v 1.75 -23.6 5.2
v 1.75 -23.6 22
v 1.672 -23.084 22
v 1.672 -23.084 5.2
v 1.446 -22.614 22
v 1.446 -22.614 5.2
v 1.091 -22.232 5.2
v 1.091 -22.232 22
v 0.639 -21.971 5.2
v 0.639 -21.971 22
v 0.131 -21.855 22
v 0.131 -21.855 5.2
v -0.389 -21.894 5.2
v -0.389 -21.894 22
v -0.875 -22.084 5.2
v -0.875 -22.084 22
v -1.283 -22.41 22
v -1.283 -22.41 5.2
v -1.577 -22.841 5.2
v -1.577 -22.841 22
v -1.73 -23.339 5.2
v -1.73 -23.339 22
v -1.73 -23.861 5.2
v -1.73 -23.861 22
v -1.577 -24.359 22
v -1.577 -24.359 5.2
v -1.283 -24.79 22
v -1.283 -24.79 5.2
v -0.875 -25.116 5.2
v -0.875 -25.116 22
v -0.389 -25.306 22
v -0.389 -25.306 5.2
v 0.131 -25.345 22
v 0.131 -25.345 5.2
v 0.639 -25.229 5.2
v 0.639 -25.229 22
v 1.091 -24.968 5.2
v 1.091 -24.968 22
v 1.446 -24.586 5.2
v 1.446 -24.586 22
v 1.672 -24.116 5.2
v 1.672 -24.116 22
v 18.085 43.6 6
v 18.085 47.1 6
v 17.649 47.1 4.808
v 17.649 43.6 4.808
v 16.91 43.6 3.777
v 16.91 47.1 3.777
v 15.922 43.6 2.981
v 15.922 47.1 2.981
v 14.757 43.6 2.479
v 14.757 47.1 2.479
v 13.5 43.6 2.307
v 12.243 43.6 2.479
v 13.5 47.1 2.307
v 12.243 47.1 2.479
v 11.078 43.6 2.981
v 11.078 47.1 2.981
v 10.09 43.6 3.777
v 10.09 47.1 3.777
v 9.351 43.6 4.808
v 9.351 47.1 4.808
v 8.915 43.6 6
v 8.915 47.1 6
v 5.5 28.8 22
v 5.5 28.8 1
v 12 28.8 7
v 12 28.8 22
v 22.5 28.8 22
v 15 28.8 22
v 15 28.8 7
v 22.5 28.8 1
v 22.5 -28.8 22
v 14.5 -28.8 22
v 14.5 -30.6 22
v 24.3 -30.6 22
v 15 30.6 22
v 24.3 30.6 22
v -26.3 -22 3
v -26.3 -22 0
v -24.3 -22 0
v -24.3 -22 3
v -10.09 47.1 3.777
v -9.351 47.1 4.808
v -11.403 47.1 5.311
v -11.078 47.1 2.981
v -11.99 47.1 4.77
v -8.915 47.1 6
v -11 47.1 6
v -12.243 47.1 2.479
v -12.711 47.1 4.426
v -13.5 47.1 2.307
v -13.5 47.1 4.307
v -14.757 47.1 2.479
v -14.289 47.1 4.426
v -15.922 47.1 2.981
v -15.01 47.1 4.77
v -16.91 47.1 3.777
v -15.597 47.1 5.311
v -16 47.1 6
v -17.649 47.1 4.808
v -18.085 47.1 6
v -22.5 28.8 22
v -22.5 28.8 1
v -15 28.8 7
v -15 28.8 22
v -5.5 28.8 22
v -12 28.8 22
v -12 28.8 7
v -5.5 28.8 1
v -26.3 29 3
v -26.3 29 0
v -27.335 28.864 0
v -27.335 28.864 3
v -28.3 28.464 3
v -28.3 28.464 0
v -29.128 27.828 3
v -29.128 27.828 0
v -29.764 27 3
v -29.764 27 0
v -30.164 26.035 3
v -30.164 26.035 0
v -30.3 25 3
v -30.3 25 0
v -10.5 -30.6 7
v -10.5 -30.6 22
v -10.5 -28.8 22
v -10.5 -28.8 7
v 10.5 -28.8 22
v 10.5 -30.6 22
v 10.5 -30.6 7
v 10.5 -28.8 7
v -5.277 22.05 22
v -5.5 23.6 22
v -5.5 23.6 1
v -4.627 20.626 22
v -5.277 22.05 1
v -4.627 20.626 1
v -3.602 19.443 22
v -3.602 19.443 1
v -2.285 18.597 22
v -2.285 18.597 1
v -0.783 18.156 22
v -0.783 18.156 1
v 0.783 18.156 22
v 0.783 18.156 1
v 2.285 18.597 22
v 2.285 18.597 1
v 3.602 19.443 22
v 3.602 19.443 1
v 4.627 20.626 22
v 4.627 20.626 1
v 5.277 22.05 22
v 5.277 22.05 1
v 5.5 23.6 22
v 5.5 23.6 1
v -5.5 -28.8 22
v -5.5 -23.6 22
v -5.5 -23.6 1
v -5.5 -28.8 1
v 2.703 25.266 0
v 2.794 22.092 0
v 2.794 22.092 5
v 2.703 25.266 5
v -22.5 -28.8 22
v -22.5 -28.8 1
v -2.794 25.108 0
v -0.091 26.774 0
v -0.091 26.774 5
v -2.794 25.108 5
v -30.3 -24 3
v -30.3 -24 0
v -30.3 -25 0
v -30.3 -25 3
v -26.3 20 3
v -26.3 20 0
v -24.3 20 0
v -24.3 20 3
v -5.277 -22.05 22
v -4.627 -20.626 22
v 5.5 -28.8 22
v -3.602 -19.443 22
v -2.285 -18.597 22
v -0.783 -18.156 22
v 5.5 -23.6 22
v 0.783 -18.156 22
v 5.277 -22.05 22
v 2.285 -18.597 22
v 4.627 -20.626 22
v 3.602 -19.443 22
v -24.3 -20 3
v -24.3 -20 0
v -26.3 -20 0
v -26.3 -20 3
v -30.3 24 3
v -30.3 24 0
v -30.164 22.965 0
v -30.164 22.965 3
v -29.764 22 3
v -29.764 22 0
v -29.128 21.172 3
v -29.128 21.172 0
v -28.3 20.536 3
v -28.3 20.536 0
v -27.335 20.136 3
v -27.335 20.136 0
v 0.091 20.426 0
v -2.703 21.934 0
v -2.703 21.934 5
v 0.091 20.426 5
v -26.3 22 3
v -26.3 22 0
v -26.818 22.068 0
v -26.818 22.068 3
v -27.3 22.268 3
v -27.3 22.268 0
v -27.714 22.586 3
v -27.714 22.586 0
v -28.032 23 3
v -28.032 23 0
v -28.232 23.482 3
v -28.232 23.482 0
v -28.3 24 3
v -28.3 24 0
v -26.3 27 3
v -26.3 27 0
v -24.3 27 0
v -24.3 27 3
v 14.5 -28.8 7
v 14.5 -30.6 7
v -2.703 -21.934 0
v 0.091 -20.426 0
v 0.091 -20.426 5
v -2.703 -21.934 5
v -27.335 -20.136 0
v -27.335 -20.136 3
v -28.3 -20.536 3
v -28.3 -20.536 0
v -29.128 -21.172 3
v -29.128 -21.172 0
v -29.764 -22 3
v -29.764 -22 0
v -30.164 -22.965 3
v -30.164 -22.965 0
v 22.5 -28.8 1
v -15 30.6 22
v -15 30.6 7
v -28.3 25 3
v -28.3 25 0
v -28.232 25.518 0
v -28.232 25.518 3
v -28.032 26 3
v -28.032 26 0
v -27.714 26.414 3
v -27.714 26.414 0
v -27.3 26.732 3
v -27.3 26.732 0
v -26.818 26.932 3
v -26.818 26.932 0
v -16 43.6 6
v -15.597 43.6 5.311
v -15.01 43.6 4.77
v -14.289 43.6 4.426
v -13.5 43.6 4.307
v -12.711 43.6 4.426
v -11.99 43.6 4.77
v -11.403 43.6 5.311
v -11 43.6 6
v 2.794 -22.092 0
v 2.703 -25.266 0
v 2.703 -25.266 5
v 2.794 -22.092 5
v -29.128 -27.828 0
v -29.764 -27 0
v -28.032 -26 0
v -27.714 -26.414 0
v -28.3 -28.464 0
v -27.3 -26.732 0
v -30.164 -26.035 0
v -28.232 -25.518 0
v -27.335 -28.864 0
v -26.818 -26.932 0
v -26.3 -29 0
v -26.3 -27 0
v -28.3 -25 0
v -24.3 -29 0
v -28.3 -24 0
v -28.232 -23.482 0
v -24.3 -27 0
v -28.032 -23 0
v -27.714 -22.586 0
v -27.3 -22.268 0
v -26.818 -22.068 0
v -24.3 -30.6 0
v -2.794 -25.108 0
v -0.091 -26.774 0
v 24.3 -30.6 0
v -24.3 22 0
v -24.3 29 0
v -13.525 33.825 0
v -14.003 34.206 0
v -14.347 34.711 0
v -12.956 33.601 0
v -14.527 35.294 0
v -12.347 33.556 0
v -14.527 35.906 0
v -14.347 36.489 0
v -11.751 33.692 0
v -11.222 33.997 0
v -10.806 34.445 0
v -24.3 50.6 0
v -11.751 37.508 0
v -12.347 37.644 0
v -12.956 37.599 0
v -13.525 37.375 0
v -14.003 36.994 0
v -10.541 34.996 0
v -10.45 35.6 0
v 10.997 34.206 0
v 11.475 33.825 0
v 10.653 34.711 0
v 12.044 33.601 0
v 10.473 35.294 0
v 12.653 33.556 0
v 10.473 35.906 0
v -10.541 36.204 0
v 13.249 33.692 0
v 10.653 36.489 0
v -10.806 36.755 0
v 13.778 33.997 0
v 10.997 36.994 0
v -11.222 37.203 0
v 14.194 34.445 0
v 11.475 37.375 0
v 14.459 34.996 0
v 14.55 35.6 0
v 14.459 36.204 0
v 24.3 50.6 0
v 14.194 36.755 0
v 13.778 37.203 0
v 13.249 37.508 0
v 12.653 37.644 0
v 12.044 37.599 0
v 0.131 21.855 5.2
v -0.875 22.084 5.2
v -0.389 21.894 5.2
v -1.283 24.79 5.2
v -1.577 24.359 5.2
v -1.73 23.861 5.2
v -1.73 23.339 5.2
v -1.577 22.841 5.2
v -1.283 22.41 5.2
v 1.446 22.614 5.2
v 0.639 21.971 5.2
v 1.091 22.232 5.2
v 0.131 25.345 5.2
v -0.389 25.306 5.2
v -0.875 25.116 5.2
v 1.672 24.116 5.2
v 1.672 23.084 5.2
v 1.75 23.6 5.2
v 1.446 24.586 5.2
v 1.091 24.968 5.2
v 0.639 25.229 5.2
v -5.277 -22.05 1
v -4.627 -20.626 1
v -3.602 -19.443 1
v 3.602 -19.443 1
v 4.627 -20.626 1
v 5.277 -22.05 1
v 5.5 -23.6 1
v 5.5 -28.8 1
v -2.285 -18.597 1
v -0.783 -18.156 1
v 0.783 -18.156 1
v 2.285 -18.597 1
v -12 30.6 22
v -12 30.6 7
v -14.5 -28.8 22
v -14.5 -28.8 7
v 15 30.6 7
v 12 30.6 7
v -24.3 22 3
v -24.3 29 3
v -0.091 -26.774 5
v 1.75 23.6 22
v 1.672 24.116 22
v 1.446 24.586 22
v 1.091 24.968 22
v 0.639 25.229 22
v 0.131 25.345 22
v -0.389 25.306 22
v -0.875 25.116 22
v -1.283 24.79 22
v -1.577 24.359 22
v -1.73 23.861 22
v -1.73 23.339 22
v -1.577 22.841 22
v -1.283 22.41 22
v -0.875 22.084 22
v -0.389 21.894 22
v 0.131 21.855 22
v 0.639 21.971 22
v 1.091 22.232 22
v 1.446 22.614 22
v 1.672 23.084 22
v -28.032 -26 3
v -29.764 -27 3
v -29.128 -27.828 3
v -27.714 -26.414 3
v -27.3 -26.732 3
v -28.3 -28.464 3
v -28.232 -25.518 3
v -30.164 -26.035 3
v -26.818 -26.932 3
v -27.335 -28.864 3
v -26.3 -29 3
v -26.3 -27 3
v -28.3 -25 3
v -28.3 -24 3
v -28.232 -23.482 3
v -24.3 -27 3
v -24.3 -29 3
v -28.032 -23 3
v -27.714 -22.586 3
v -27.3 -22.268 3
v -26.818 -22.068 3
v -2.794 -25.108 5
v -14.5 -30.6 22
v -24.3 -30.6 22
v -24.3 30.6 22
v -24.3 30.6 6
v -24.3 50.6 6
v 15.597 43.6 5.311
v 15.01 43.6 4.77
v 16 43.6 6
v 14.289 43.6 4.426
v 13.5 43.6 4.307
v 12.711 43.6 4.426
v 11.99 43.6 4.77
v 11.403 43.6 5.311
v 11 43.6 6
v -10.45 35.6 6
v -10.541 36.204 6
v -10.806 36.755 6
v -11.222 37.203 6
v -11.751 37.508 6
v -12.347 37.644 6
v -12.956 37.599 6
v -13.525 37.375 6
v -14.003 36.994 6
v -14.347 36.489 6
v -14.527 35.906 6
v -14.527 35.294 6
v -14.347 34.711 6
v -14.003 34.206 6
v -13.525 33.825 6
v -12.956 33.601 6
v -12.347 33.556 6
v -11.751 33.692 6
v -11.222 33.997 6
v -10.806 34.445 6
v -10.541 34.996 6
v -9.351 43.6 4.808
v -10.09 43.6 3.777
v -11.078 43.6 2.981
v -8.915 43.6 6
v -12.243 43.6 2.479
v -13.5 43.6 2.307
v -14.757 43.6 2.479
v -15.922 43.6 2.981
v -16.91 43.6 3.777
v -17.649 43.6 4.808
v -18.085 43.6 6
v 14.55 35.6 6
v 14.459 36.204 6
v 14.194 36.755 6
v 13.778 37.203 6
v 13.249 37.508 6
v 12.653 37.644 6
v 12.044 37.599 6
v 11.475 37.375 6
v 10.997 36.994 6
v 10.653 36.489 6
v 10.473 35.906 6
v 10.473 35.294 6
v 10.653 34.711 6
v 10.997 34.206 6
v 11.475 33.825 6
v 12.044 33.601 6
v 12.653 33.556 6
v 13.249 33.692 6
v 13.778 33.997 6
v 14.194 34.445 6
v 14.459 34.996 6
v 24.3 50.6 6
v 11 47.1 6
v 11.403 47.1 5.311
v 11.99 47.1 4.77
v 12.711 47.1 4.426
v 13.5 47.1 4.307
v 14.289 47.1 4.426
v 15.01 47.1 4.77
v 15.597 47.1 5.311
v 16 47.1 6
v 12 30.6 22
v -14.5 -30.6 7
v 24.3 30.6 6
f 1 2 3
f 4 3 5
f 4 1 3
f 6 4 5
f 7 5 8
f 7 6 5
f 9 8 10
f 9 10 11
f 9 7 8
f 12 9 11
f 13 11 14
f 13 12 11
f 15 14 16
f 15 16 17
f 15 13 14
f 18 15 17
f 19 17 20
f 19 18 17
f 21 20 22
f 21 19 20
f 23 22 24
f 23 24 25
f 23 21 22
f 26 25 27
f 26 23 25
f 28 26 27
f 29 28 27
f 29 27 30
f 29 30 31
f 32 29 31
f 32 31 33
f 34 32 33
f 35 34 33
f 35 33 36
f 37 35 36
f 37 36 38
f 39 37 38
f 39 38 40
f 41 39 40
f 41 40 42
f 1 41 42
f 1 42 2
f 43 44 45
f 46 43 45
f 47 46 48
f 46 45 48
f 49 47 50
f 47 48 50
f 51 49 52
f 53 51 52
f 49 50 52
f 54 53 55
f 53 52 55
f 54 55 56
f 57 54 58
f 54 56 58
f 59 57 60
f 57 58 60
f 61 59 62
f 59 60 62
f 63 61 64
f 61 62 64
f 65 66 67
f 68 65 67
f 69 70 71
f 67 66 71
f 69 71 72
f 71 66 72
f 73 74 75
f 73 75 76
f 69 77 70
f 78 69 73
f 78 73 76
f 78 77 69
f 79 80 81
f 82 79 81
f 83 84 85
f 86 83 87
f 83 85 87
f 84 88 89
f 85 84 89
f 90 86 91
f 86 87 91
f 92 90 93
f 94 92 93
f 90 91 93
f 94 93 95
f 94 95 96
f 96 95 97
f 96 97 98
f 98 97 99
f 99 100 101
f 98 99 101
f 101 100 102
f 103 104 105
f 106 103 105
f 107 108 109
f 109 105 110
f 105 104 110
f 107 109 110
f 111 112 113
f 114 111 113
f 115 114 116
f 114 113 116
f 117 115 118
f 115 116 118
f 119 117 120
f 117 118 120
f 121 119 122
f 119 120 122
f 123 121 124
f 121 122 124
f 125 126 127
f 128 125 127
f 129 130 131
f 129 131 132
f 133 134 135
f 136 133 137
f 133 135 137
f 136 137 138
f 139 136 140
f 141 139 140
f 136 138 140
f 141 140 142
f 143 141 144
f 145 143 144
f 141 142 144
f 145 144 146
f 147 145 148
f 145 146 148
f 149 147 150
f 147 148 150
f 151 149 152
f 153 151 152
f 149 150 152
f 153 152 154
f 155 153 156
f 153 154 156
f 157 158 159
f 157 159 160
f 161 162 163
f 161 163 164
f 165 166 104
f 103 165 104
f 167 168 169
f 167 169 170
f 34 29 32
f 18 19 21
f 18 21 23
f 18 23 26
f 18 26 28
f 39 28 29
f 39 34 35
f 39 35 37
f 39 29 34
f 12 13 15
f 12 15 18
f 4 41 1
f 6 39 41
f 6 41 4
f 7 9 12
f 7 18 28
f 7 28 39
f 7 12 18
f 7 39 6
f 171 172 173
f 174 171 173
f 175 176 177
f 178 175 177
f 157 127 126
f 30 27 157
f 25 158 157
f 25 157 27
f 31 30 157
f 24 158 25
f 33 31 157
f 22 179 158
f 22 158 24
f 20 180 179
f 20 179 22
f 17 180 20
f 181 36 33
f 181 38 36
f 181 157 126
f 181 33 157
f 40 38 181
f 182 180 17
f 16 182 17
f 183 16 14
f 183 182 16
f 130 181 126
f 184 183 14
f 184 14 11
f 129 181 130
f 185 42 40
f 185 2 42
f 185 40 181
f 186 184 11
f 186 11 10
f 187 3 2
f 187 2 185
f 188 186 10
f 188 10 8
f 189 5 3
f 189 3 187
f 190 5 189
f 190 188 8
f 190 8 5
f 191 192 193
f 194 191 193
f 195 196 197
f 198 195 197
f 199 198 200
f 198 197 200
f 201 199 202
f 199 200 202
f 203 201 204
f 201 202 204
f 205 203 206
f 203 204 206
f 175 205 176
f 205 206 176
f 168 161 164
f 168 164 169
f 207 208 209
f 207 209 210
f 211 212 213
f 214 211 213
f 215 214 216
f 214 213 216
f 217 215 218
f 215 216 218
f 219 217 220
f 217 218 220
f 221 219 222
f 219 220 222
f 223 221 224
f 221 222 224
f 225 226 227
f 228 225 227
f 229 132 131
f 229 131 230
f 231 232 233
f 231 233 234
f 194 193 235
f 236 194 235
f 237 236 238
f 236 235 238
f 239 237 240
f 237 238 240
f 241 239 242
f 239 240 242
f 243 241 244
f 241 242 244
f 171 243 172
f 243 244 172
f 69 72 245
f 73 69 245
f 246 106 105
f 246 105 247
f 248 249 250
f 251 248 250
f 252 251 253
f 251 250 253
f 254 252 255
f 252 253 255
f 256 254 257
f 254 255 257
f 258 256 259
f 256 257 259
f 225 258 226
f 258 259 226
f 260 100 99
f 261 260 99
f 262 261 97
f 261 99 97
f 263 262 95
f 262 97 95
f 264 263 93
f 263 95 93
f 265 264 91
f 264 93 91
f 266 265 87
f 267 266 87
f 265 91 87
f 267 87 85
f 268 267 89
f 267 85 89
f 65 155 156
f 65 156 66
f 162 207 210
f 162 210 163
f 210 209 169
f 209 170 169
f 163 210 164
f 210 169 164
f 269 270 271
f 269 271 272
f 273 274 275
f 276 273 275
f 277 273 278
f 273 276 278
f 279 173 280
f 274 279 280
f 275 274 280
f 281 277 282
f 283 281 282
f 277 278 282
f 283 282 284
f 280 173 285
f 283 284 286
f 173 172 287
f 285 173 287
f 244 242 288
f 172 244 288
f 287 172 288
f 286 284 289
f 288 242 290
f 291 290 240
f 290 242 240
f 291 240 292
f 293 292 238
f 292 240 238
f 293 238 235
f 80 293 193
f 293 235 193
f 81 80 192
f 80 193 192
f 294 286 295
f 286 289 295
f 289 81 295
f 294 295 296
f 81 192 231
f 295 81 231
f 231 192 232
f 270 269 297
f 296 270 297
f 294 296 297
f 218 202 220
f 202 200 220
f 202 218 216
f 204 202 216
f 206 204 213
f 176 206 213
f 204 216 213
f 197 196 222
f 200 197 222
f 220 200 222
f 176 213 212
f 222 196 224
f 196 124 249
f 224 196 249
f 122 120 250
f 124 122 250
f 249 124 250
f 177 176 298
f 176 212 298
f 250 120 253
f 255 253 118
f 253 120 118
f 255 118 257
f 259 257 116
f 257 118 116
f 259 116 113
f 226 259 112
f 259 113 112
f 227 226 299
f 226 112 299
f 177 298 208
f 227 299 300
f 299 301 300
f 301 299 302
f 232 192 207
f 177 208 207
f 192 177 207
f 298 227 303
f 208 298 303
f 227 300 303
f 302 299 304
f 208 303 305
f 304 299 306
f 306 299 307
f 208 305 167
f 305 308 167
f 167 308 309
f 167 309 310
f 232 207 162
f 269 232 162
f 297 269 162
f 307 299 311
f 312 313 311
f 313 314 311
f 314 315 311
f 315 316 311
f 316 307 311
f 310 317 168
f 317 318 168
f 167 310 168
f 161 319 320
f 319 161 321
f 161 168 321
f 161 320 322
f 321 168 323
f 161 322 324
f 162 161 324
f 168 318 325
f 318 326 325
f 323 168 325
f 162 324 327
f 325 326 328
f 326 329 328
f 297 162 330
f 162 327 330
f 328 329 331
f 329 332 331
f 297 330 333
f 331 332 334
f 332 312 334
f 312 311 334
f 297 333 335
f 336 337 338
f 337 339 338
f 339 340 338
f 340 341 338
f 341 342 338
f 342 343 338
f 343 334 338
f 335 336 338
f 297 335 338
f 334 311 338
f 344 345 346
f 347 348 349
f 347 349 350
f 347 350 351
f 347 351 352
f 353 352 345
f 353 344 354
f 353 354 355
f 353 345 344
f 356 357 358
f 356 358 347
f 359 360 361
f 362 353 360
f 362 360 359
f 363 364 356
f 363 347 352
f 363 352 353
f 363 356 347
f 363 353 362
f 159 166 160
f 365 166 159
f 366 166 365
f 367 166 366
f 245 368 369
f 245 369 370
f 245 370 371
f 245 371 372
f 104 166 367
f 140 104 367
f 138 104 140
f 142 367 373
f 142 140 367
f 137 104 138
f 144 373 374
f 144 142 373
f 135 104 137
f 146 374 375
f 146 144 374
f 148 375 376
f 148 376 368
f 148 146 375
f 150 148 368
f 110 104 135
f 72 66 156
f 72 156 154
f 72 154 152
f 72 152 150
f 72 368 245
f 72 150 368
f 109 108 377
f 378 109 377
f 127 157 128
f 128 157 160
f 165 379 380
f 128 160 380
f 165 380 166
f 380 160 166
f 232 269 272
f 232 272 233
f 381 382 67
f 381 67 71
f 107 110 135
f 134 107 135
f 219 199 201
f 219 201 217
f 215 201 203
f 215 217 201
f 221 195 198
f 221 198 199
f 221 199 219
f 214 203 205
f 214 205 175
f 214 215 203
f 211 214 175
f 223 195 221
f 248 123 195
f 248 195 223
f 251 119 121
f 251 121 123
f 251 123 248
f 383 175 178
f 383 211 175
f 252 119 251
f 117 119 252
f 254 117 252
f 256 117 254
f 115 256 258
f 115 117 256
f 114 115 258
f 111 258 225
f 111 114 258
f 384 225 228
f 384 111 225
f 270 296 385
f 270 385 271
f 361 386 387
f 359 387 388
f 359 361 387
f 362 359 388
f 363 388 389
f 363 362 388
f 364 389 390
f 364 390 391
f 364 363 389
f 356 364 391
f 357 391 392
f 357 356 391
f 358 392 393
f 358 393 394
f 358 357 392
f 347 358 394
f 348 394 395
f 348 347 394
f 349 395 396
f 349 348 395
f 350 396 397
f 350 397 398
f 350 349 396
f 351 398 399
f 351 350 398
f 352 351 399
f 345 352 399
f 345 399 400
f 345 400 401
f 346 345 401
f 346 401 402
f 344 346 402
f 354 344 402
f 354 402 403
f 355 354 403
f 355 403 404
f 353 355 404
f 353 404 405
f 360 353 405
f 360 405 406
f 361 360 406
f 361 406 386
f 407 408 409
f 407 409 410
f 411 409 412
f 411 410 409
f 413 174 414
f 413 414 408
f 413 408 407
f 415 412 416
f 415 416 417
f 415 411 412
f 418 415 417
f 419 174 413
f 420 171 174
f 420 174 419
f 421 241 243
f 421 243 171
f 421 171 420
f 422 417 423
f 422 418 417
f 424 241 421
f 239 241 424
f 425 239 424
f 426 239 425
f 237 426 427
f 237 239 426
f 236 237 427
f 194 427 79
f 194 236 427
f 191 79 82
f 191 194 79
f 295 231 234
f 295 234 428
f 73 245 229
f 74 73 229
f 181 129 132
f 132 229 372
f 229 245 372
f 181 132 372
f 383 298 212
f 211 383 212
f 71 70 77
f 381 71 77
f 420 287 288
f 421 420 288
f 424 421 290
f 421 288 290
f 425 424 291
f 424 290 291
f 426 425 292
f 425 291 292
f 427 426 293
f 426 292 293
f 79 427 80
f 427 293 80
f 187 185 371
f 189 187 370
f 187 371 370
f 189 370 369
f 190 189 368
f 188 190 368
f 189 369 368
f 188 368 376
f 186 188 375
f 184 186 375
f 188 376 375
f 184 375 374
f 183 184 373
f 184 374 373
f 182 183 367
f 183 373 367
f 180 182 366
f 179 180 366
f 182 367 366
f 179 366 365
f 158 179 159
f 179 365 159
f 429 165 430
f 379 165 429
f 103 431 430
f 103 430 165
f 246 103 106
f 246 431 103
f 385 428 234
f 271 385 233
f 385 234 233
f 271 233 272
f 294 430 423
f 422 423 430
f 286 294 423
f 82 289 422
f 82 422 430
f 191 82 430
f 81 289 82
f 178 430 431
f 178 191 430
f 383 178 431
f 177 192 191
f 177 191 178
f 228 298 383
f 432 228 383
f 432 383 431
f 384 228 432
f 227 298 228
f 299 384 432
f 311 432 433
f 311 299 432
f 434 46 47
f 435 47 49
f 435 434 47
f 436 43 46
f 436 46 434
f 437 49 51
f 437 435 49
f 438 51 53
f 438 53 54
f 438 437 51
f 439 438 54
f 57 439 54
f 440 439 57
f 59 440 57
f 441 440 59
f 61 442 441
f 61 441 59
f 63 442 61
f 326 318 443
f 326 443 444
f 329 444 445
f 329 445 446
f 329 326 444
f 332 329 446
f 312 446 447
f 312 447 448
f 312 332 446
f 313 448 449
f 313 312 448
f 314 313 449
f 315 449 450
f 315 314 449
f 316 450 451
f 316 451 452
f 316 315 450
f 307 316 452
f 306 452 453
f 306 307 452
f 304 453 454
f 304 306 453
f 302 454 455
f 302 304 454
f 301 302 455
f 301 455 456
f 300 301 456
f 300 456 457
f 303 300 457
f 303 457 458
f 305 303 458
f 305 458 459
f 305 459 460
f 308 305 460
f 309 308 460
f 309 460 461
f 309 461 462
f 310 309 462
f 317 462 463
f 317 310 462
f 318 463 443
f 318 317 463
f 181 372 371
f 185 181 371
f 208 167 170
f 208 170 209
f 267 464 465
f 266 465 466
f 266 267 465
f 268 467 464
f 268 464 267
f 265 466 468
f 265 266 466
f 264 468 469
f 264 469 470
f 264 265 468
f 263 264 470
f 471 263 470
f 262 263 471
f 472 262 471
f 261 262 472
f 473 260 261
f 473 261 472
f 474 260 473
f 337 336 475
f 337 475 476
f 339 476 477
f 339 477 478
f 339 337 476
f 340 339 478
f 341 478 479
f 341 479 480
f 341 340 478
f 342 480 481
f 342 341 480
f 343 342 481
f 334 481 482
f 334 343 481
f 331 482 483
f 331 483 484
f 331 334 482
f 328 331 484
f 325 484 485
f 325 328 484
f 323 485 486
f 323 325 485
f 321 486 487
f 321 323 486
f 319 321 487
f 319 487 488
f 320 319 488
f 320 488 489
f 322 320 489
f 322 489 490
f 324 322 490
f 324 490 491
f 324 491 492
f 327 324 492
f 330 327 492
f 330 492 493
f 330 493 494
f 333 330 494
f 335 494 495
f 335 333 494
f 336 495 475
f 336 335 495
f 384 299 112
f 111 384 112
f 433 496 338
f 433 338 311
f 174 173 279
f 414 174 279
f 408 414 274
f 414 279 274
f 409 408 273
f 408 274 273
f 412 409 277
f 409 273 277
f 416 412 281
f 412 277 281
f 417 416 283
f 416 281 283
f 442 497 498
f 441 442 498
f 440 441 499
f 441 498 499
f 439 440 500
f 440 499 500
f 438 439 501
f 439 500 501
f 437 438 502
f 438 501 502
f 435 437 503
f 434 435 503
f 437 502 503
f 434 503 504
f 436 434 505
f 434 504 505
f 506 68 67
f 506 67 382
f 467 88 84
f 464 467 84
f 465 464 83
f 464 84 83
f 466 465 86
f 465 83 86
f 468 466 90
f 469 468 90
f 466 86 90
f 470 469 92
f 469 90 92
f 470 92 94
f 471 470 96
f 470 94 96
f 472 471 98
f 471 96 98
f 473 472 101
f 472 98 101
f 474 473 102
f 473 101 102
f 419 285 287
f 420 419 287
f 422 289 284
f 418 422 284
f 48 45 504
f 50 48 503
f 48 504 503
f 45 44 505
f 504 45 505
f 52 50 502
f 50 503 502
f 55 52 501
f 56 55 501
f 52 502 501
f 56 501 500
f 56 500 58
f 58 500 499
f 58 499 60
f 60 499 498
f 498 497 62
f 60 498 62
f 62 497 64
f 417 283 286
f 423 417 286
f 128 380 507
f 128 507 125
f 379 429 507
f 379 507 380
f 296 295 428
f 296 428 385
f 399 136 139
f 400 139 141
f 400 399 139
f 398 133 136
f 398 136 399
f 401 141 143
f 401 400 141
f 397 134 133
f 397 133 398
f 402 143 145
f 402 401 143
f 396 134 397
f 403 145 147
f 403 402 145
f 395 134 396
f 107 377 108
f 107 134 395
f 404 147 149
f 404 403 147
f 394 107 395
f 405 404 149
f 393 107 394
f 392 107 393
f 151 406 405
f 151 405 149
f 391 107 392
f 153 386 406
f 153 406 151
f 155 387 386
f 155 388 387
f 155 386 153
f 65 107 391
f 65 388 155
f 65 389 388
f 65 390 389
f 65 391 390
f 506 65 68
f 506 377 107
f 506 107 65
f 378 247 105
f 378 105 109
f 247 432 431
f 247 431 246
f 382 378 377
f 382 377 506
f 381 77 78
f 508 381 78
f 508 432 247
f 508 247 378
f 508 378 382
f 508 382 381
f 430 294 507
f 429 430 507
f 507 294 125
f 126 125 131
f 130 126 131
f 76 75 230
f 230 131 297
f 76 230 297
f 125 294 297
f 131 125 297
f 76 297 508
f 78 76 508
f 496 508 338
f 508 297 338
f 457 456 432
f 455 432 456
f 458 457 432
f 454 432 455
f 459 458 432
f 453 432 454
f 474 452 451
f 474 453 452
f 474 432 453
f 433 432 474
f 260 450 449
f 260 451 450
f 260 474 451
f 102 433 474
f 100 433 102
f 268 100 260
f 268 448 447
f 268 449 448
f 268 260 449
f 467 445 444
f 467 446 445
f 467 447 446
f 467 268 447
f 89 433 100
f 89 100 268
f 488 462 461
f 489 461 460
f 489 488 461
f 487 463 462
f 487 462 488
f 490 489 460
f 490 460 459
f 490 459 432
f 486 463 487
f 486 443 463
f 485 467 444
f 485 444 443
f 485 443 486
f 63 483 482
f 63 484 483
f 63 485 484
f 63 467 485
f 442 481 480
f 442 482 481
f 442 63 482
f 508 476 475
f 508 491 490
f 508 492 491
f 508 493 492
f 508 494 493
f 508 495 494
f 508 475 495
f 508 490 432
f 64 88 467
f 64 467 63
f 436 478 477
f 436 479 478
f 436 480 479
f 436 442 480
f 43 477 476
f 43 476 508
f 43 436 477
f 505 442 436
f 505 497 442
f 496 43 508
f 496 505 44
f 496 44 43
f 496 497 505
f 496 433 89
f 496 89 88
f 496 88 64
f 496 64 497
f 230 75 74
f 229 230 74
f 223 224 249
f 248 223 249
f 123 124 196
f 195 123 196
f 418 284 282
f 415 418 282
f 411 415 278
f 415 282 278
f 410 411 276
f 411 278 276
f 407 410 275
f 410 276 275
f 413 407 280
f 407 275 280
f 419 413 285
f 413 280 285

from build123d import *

# Parameters (mm, degrees)
F0_W      = 48.6
F0_H      = 61.2
F1_DEPTH  = 22
F0_R      = 1.75
F2_DEPTH  = 22
F3_DEPTH  = 1
F0_H_2    = 20
F0_R_2    = 2.05
F4_DEPTH  = 6
F5_W      = 3
F5_H      = 1.8
F5_W_2    = 4
F6_DEPTH  = 15
F8_DEPTH  = 7
F9_DEPTH  = 3.5
F11_DEPTH = 5.2
F12_DEPTH = 5
F14_DEPTH = 3


with BuildPart() as f1:
    # F0 (on Top) → F1 (new body)
    with BuildSketch(Plane.XY):
        Rectangle(F0_W, F0_H)
        Polygon((22.5, 28.8), (22.5, -28.8), (5.5, -28.8), (-5.5, -28.8), (-22.5, -28.8), (-22.5, 28.8), (-5.5, 28.8), (5.5, 28.8), align=None, mode=Mode.SUBTRACT)
    extrude(amount=F1_DEPTH)

    # F0 (on Top) → F2 (join)
    with BuildSketch(Plane.XY):
        with BuildLine():
            Line((-5.5, -28.8), (5.5, -28.8))
            Line((5.5, -28.8), (5.5, -23.6))
            ThreePointArc((5.5, -23.6), (0, -18.1), (-5.5, -23.6))
            Line((-5.5, -23.6), (-5.5, -28.8))
        make_face()
        with Locations((0, -23.6)):
            Circle(F0_R, mode=Mode.SUBTRACT)
        with BuildLine():
            Line((5.5, 23.6), (5.5, 28.8))
            Line((5.5, 28.8), (-5.5, 28.8))
            Line((-5.5, 28.8), (-5.5, 23.6))
            ThreePointArc((-5.5, 23.6), (0, 18.1), (5.5, 23.6))
        make_face()
        with Locations((0, 23.6)):
            Circle(F0_R, mode=Mode.SUBTRACT)
    extrude(amount=F2_DEPTH)

    # F0 (on Top) → F3 (join)
    with BuildSketch(Plane.XY):
        with BuildLine():
            Line((5.5, -28.8), (22.5, -28.8))
            Line((22.5, -28.8), (22.5, 28.8))
            Line((22.5, 28.8), (5.5, 28.8))
            Line((5.5, 28.8), (5.5, 23.6))
            ThreePointArc((5.5, 23.6), (0, 18.1), (-5.5, 23.6))
            Line((-5.5, 23.6), (-5.5, 28.8))
            Line((-5.5, 28.8), (-22.5, 28.8))
            Line((-22.5, 28.8), (-22.5, -28.8))
            Line((-22.5, -28.8), (-5.5, -28.8))
            Line((-5.5, -28.8), (-5.5, -23.6))
            ThreePointArc((-5.5, -23.6), (0, -18.1), (5.5, -23.6))
            Line((5.5, -23.6), (5.5, -28.8))
        make_face()
    extrude(amount=F3_DEPTH)

    # F0 (on Top) → F4 (join)
    with BuildSketch(Plane.XY):
        with Locations((0, 40.6)):
            Rectangle(F0_W, F0_H_2)
        with Locations((-12.5, 35.6)):
            Circle(F0_R_2, mode=Mode.SUBTRACT)
        with Locations((12.5, 35.6)):
            Circle(F0_R_2, mode=Mode.SUBTRACT)
    extrude(amount=F4_DEPTH)

    # F5 (on face) → F6 (cut)
    with BuildSketch(Plane.XY.offset(22)):
        with Locations((-13.5, 29.7)):
            Rectangle(F5_W, F5_H)
        with Locations((13.5, 29.7)):
            Rectangle(F5_W, F5_H)
        with Locations((-12.5, -29.7)):
            Rectangle(F5_W_2, F5_H)
        with Locations((12.5, -29.7)):
            Rectangle(F5_W_2, F5_H)
    extrude(amount=-F6_DEPTH, mode=Mode.SUBTRACT)

    # F7 (on face) → F8 (cut)
    with BuildSketch(Plane(origin=(0, 50.6, 0), x_dir=(-1, 0, 0), z_dir=(0, 1, 0))):
        with BuildLine():
            Line((11, 6), (8.9152066989, 6))
            ThreePointArc((8.9152066989, 6), (13.5, 2.3074175964), (18.0847933011, 6))
            Line((18.0847933011, 6), (16, 6))
            ThreePointArc((16, 6), (13.5, 4.3074175964), (11, 6))
        make_face()
        with BuildLine():
            Line((-16, 6), (-18.0847933011, 6))
            ThreePointArc((-18.0847933011, 6), (-13.5, 2.3074175964), (-8.9152066989, 6))
            Line((-8.9152066989, 6), (-11, 6))
            ThreePointArc((-11, 6), (-13.5, 4.3074175964), (-16, 6))
        make_face()
    extrude(amount=-F8_DEPTH, mode=Mode.SUBTRACT)

    # F7 (on face) → F9 (join)
    with BuildSketch(Plane(origin=(0, 50.6, 0), x_dir=(-1, 0, 0), z_dir=(0, 1, 0))):
        with BuildLine():
            Line((11, 6), (8.9152066989, 6))
            ThreePointArc((8.9152066989, 6), (13.5, 2.3074175964), (18.0847933011, 6))
            Line((18.0847933011, 6), (16, 6))
            ThreePointArc((16, 6), (13.5, 4.3074175964), (11, 6))
        make_face()
        with BuildLine():
            Line((-16, 6), (-18.0847933011, 6))
            ThreePointArc((-18.0847933011, 6), (-13.5, 2.3074175964), (-8.9152066989, 6))
            Line((-8.9152066989, 6), (-11, 6))
            ThreePointArc((-11, 6), (-13.5, 4.3074175964), (-16, 6))
        make_face()
    extrude(amount=-F9_DEPTH)

    # F0 (on Top) → F11 (join)
    with BuildSketch(Plane.XY):
        with Locations((0, 23.6)):
            Circle(F0_R)
        with Locations((0, -23.6)):
            Circle(F0_R)
    extrude(amount=F11_DEPTH)

    # F10 (on face) → F12 (cut)
    with BuildSketch(Plane.XY):
        Polygon((-2.7033752158, 21.9341381282), (0.0909910922, 20.4258774513), (2.7943663081, 22.091739323), (2.7033752158, 25.2658618718), (-0.0909910922, 26.7741225487), (-2.7943663081, 25.108260677), align=None)
        Polygon((2.7033752158, -25.2658618718), (2.7943663081, -22.091739323), (0.0909910922, -20.4258774513), (-2.7033752158, -21.9341381282), (-2.7943663081, -25.108260677), (-0.0909910922, -26.7741225487), align=None)
    extrude(amount=F12_DEPTH, mode=Mode.SUBTRACT)

    # F13 (on face) → F14 (join)
    with BuildSketch(Plane.XY):
        with BuildLine():
            Line((-26.3, -29), (-24.3, -29))
            Line((-24.3, -29), (-24.3, -27))
            Line((-24.3, -27), (-26.3, -27))
            ThreePointArc((-26.3, -27), (-27.7142135624, -26.4142135624), (-28.3, -25))
            Line((-28.3, -25), (-28.3, -24))
            ThreePointArc((-28.3, -24), (-27.7142135624, -22.5857864376), (-26.3, -22))
            Line((-26.3, -22), (-24.3, -22))
            Line((-24.3, -22), (-24.3, -20))
            Line((-24.3, -20), (-26.3, -20))
            ThreePointArc((-26.3, -20), (-29.1284271247, -21.1715728753), (-30.3, -24))
            Line((-30.3, -24), (-30.3, -25))
            ThreePointArc((-30.3, -25), (-29.1284271247, -27.8284271247), (-26.3, -29))
        make_face()
        with BuildLine():
            Line((-26.3, 20), (-24.3, 20))
            Line((-24.3, 20), (-24.3, 22))
            Line((-24.3, 22), (-26.3, 22))
            ThreePointArc((-26.3, 22), (-27.7142135624, 22.5857864376), (-28.3, 24))
            Line((-28.3, 24), (-28.3, 25))
            ThreePointArc((-28.3, 25), (-27.7142135624, 26.4142135624), (-26.3, 27))
            Line((-26.3, 27), (-24.3, 27))
            Line((-24.3, 27), (-24.3, 29))
            Line((-24.3, 29), (-26.3, 29))
            ThreePointArc((-26.3, 29), (-29.1284271247, 27.8284271247), (-30.3, 25))
            Line((-30.3, 25), (-30.3, 24))
            ThreePointArc((-30.3, 24), (-29.1284271247, 21.1715728753), (-26.3, 20))
        make_face()
    extrude(amount=F14_DEPTH)


solid = f1.part
